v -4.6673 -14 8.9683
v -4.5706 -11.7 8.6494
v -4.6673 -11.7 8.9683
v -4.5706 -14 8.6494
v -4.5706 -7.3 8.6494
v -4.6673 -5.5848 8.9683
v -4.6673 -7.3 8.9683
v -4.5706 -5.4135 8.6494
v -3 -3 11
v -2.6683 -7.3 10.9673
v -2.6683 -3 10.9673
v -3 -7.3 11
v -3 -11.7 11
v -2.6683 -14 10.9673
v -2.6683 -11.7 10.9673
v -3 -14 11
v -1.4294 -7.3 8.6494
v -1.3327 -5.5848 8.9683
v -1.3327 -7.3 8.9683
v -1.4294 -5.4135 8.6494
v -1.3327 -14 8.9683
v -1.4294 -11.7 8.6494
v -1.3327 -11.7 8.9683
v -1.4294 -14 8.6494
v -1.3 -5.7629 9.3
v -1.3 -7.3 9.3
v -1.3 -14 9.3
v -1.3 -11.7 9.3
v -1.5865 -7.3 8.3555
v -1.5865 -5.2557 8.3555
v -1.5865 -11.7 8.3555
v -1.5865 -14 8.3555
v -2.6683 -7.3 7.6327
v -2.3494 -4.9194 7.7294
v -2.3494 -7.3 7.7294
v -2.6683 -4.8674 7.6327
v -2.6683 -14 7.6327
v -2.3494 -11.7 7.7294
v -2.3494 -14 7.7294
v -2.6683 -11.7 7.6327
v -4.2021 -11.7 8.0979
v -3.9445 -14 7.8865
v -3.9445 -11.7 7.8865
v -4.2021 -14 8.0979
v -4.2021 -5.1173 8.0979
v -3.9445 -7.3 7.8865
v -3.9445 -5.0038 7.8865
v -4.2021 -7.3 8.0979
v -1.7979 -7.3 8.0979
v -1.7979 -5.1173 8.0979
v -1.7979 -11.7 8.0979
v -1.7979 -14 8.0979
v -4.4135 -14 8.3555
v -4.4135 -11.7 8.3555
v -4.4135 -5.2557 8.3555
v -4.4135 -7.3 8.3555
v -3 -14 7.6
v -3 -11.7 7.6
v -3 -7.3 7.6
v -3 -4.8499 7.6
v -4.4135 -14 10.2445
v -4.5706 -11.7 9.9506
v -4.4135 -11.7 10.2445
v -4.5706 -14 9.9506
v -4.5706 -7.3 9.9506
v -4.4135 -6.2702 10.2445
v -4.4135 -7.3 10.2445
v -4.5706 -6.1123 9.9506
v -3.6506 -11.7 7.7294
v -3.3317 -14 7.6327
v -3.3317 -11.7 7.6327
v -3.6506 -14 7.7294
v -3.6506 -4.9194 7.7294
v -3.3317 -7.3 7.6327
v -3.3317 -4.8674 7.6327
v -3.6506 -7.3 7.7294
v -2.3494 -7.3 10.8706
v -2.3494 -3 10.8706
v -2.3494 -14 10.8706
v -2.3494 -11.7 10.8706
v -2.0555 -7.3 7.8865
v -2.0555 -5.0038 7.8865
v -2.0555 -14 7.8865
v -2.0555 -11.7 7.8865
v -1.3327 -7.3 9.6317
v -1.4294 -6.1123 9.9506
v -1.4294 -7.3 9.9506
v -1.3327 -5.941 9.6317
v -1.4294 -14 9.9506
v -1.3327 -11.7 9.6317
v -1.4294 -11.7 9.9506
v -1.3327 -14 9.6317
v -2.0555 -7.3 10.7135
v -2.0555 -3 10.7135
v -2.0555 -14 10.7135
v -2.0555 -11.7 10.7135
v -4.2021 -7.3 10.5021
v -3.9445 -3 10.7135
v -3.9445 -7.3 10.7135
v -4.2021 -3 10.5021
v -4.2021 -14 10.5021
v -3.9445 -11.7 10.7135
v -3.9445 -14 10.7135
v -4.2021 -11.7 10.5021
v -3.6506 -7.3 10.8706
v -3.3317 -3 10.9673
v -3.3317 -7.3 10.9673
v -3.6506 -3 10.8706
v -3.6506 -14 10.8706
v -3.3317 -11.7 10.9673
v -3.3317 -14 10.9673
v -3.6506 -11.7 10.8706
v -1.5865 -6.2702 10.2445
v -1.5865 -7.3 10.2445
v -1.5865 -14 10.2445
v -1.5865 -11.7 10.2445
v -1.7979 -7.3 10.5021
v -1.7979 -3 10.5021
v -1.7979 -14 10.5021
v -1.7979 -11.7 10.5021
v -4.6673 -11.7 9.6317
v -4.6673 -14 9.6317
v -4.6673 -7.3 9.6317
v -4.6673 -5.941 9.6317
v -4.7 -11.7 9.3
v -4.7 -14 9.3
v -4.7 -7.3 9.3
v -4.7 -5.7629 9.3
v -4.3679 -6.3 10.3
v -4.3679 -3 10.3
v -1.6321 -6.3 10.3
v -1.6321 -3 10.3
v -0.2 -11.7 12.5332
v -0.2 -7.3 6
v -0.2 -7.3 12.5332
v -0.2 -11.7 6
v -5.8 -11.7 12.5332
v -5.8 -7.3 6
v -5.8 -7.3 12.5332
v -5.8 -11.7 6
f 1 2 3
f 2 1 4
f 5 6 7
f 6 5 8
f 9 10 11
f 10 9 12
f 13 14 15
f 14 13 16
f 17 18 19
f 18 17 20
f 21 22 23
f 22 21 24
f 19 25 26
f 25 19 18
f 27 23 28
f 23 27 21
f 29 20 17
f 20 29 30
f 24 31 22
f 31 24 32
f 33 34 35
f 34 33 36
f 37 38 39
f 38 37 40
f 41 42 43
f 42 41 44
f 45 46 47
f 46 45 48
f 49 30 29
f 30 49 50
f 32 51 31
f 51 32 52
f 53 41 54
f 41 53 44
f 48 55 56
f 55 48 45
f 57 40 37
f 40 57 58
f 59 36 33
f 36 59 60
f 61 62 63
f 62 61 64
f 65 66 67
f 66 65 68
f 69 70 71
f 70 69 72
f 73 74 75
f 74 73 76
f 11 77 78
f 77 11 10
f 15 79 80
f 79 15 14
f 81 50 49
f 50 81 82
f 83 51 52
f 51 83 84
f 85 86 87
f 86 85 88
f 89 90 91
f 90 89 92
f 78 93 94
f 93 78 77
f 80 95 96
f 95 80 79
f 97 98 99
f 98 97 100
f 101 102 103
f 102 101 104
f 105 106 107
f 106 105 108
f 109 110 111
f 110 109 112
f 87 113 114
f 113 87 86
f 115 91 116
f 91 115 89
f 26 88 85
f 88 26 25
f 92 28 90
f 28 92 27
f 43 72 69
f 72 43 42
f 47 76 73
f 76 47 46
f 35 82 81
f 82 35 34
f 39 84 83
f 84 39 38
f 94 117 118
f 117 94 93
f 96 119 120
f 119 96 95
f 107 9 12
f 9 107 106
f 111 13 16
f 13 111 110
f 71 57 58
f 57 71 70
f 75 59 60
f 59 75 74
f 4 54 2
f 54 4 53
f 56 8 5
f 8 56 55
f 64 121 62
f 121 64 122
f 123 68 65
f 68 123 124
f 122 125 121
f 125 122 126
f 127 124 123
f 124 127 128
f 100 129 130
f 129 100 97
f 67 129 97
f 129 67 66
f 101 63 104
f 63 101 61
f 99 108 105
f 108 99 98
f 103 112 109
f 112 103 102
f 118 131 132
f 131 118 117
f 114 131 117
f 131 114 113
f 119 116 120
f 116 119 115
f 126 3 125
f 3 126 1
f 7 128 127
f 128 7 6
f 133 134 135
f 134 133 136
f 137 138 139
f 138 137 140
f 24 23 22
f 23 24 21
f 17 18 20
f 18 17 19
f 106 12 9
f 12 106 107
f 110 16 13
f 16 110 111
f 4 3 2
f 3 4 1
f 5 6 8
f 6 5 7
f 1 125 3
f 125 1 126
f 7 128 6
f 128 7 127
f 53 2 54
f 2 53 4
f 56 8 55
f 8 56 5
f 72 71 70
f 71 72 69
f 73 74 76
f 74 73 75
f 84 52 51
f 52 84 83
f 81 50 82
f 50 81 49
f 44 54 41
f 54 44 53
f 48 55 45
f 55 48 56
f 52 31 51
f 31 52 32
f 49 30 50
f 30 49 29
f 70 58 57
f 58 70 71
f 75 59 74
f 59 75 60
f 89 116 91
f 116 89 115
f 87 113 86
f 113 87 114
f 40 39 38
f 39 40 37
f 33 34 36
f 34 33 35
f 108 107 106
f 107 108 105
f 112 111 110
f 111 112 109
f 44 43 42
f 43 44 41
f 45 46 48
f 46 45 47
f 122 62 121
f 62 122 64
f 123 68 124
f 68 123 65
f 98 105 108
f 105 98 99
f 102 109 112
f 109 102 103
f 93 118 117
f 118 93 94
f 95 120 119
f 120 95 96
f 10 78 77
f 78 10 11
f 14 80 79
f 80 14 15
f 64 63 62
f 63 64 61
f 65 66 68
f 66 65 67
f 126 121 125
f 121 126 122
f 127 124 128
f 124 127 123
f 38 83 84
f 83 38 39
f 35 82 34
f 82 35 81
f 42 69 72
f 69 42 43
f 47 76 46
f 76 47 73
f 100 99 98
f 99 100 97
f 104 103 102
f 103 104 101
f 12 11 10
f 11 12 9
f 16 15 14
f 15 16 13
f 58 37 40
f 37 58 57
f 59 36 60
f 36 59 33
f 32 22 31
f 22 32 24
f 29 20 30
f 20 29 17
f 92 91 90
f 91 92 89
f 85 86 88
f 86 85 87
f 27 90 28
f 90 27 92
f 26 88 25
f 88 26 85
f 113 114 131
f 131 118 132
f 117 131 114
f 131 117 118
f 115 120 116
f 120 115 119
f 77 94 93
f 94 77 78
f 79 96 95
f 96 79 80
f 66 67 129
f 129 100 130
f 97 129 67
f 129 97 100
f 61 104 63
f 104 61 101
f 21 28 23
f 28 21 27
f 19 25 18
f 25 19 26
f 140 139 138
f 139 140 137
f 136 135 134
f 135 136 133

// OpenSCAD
// The x-slider must be mirror-symmetric about its own centre (x = xs_xc),
// so one STL serves both towers (X adjust screw from either end).
// Symmetric difference must render empty.
include <../stage.scad>
module a() { stage_x_slider(); }
module b() { translate([xs_xc, 0, 0]) mirror([1, 0, 0]) translate([-xs_xc, 0, 0]) stage_x_slider(); }
union() { difference() { a(); b(); } difference() { b(); a(); } }
